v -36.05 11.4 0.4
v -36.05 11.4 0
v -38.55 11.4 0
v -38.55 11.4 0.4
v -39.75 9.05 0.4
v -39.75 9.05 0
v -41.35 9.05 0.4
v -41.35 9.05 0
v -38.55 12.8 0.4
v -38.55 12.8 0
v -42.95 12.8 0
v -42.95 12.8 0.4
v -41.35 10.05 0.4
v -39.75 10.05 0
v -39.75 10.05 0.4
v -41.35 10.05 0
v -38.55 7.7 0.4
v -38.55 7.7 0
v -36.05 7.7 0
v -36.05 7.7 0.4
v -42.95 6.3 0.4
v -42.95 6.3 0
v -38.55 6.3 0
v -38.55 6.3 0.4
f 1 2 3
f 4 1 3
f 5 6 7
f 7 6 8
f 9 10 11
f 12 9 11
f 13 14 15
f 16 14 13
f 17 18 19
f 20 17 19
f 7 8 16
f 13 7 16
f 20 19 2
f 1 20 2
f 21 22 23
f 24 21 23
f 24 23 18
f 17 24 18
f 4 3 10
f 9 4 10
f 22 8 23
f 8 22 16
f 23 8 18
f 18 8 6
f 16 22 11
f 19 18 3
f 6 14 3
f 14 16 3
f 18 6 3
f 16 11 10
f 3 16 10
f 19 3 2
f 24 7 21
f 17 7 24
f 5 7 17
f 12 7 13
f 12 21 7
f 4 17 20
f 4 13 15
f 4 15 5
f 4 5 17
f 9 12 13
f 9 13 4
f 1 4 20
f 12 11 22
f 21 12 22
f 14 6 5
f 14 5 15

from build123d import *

# Parameters (mm, degrees)
PAD002_DEPTH    = 0.4
SKETCH010_W     = 1.6
SKETCH010_H     = 1
POCKET006_DEPTH = 0.401


with BuildPart() as contact:
    # Sketch009 (on Face1 of ShapeBinder) → Pad002 (new body)
    with BuildSketch(Plane(origin=(0, 0, 0), x_dir=(1, 0, 0), z_dir=(0, 0, -1))):
        Polygon((36.05, 11.4), (38.55, 11.4), (38.55, 12.8), (42.95, 12.8), (42.95, 6.3), (38.55, 6.3), (38.55, 7.7), (36.05, 7.7), align=None)
    extrude(amount=-PAD002_DEPTH)

    # Sketch010 (on Face9 of Pad002) → Pocket006 (cut, through all)
    with BuildSketch(Plane(origin=(0, 0, 0), x_dir=(1, 0, 0), z_dir=(0, 0, -1))):
        with Locations((40.55, 9.55)):
            Rectangle(SKETCH010_W, SKETCH010_H)
    extrude(amount=-POCKET006_DEPTH, mode=Mode.SUBTRACT)


with BuildPart() as contact_mirrored:
    # mirror: instance of contact
    add(contact.part.mirror(Plane(origin=(0, 19.85, 7), x_dir=(0, 1, 0), z_dir=(-1, 0, 0))))


with BuildPart() as contact_mirrored_mirrored:
    # mirror001: instance of contact (mirrored) 
    add(contact_mirrored.part.mirror(Plane(origin=(-38.55, 0, 15), x_dir=(-1, 0, 0), z_dir=(0, -1, 0))))


solid = contact_mirrored_mirrored.part
